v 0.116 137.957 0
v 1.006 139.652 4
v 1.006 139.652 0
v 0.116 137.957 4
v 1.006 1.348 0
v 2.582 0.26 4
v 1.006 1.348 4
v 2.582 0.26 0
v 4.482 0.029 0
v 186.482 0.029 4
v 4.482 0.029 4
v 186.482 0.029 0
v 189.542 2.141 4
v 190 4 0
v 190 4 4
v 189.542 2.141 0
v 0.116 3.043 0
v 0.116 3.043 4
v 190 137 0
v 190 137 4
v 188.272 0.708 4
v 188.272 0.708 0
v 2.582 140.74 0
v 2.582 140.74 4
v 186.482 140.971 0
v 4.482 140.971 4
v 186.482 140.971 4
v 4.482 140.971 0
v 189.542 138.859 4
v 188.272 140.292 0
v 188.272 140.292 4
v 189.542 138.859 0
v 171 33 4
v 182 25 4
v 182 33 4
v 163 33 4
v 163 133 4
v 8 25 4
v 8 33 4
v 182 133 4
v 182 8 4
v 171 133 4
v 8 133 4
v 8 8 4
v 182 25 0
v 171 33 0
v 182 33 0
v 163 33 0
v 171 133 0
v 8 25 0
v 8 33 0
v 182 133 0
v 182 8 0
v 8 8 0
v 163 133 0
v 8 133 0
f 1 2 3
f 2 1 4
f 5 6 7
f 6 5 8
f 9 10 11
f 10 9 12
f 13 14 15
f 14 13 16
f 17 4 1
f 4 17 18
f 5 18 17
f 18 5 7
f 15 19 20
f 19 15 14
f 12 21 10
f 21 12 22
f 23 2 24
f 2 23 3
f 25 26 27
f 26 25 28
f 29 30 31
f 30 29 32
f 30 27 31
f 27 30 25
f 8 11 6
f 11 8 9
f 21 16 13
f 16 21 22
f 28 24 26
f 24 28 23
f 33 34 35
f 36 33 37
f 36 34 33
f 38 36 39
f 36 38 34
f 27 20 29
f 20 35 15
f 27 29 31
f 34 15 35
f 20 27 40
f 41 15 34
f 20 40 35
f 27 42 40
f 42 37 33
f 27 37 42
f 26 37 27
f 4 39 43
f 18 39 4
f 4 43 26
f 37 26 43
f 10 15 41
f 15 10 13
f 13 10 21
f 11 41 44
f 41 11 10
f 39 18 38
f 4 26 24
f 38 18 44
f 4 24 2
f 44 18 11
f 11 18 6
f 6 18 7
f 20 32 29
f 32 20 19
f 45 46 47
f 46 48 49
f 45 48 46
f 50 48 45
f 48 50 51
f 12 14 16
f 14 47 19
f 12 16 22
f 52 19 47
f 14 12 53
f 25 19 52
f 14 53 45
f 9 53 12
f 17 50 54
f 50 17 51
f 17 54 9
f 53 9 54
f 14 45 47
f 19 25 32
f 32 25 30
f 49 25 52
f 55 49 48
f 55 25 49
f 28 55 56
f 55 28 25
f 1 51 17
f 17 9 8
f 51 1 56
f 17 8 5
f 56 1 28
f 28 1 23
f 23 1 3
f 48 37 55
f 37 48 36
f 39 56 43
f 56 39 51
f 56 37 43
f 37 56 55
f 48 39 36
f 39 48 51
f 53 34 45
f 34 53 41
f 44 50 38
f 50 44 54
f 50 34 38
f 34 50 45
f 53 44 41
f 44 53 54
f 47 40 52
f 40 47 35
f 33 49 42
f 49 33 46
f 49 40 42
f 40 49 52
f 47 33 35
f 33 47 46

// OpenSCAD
frm_front       = 8;
dim_front       = [190,141,4];
mki_front       = 8;          // minkowski dim of frontplate
loc_front       = [mki_front/2,mki_front/2,0];

dim_display     = [155,100,dim_front[2]];
loc_display     = [frm_front,dim_front[1]-dim_display[1]-frm_front,0];
dia_scw_display = 2;
dph_scw_display = dim_front[2]-1;
hed_scw_display = 5;
loc_scw_display = [[4.17,dim_display[1]+4.9,0],
                   [dim_display[0]-4.17,dim_display[1]+4.9,0],
                   [4.17,-4.9,0],
                   [dim_display[0]-4.17,-4.9,0]]; //relative to display


dim_switches    = [dim_front[0]-2*frm_front,
                   dim_front[1]-dim_display[1]-3*frm_front,
                   dim_front[2]];
loc_switches    = [frm_front,
                   dim_front[1]-dim_switches[1]-dim_display[1]-2*frm_front,
                   0];
                   
dim_plugs       = [dim_front[0]-dim_display[0]-3*frm_front,
                   dim_front[1]-dim_switches[1]-3*frm_front,
                   dim_front[2]];
loc_plugs       = [dim_display[0]+2*frm_front,
                   dim_switches[1]+2*frm_front,
                   0];
                   
 

difference(){
    frontplate();
    display();
    switches();
    plugs();
}
#screws();

module frontplate(){
    minkowski() {
        translate(loc_front)
            cube([dim_front[0]-mki_front,
                 dim_front[1]-mki_front,
                 dim_front[2]/2]);
        cylinder(d=mki_front, h=dim_front[2]/2);
    }
}

module display(){
    translate(loc_display)
        cube(dim_display);
}

module switches(){
    translate(loc_switches)
        cube(dim_switches);
}

module plugs(){
    translate(loc_plugs)
        cube(dim_plugs);
}

module screws(){
    translate(loc_display){
        for(loc=loc_scw_display){
            translate(loc)
                cylinder(h=dph_scw_display,d=dia_scw_display);
        }
    }
}

//cube([100,100,50]);
//translate([200*$t,100*$t,0])
//rotate([0,$t*360,0])
//cylinder(d1=500*$t,d2=$t*500, h=50*$t);
